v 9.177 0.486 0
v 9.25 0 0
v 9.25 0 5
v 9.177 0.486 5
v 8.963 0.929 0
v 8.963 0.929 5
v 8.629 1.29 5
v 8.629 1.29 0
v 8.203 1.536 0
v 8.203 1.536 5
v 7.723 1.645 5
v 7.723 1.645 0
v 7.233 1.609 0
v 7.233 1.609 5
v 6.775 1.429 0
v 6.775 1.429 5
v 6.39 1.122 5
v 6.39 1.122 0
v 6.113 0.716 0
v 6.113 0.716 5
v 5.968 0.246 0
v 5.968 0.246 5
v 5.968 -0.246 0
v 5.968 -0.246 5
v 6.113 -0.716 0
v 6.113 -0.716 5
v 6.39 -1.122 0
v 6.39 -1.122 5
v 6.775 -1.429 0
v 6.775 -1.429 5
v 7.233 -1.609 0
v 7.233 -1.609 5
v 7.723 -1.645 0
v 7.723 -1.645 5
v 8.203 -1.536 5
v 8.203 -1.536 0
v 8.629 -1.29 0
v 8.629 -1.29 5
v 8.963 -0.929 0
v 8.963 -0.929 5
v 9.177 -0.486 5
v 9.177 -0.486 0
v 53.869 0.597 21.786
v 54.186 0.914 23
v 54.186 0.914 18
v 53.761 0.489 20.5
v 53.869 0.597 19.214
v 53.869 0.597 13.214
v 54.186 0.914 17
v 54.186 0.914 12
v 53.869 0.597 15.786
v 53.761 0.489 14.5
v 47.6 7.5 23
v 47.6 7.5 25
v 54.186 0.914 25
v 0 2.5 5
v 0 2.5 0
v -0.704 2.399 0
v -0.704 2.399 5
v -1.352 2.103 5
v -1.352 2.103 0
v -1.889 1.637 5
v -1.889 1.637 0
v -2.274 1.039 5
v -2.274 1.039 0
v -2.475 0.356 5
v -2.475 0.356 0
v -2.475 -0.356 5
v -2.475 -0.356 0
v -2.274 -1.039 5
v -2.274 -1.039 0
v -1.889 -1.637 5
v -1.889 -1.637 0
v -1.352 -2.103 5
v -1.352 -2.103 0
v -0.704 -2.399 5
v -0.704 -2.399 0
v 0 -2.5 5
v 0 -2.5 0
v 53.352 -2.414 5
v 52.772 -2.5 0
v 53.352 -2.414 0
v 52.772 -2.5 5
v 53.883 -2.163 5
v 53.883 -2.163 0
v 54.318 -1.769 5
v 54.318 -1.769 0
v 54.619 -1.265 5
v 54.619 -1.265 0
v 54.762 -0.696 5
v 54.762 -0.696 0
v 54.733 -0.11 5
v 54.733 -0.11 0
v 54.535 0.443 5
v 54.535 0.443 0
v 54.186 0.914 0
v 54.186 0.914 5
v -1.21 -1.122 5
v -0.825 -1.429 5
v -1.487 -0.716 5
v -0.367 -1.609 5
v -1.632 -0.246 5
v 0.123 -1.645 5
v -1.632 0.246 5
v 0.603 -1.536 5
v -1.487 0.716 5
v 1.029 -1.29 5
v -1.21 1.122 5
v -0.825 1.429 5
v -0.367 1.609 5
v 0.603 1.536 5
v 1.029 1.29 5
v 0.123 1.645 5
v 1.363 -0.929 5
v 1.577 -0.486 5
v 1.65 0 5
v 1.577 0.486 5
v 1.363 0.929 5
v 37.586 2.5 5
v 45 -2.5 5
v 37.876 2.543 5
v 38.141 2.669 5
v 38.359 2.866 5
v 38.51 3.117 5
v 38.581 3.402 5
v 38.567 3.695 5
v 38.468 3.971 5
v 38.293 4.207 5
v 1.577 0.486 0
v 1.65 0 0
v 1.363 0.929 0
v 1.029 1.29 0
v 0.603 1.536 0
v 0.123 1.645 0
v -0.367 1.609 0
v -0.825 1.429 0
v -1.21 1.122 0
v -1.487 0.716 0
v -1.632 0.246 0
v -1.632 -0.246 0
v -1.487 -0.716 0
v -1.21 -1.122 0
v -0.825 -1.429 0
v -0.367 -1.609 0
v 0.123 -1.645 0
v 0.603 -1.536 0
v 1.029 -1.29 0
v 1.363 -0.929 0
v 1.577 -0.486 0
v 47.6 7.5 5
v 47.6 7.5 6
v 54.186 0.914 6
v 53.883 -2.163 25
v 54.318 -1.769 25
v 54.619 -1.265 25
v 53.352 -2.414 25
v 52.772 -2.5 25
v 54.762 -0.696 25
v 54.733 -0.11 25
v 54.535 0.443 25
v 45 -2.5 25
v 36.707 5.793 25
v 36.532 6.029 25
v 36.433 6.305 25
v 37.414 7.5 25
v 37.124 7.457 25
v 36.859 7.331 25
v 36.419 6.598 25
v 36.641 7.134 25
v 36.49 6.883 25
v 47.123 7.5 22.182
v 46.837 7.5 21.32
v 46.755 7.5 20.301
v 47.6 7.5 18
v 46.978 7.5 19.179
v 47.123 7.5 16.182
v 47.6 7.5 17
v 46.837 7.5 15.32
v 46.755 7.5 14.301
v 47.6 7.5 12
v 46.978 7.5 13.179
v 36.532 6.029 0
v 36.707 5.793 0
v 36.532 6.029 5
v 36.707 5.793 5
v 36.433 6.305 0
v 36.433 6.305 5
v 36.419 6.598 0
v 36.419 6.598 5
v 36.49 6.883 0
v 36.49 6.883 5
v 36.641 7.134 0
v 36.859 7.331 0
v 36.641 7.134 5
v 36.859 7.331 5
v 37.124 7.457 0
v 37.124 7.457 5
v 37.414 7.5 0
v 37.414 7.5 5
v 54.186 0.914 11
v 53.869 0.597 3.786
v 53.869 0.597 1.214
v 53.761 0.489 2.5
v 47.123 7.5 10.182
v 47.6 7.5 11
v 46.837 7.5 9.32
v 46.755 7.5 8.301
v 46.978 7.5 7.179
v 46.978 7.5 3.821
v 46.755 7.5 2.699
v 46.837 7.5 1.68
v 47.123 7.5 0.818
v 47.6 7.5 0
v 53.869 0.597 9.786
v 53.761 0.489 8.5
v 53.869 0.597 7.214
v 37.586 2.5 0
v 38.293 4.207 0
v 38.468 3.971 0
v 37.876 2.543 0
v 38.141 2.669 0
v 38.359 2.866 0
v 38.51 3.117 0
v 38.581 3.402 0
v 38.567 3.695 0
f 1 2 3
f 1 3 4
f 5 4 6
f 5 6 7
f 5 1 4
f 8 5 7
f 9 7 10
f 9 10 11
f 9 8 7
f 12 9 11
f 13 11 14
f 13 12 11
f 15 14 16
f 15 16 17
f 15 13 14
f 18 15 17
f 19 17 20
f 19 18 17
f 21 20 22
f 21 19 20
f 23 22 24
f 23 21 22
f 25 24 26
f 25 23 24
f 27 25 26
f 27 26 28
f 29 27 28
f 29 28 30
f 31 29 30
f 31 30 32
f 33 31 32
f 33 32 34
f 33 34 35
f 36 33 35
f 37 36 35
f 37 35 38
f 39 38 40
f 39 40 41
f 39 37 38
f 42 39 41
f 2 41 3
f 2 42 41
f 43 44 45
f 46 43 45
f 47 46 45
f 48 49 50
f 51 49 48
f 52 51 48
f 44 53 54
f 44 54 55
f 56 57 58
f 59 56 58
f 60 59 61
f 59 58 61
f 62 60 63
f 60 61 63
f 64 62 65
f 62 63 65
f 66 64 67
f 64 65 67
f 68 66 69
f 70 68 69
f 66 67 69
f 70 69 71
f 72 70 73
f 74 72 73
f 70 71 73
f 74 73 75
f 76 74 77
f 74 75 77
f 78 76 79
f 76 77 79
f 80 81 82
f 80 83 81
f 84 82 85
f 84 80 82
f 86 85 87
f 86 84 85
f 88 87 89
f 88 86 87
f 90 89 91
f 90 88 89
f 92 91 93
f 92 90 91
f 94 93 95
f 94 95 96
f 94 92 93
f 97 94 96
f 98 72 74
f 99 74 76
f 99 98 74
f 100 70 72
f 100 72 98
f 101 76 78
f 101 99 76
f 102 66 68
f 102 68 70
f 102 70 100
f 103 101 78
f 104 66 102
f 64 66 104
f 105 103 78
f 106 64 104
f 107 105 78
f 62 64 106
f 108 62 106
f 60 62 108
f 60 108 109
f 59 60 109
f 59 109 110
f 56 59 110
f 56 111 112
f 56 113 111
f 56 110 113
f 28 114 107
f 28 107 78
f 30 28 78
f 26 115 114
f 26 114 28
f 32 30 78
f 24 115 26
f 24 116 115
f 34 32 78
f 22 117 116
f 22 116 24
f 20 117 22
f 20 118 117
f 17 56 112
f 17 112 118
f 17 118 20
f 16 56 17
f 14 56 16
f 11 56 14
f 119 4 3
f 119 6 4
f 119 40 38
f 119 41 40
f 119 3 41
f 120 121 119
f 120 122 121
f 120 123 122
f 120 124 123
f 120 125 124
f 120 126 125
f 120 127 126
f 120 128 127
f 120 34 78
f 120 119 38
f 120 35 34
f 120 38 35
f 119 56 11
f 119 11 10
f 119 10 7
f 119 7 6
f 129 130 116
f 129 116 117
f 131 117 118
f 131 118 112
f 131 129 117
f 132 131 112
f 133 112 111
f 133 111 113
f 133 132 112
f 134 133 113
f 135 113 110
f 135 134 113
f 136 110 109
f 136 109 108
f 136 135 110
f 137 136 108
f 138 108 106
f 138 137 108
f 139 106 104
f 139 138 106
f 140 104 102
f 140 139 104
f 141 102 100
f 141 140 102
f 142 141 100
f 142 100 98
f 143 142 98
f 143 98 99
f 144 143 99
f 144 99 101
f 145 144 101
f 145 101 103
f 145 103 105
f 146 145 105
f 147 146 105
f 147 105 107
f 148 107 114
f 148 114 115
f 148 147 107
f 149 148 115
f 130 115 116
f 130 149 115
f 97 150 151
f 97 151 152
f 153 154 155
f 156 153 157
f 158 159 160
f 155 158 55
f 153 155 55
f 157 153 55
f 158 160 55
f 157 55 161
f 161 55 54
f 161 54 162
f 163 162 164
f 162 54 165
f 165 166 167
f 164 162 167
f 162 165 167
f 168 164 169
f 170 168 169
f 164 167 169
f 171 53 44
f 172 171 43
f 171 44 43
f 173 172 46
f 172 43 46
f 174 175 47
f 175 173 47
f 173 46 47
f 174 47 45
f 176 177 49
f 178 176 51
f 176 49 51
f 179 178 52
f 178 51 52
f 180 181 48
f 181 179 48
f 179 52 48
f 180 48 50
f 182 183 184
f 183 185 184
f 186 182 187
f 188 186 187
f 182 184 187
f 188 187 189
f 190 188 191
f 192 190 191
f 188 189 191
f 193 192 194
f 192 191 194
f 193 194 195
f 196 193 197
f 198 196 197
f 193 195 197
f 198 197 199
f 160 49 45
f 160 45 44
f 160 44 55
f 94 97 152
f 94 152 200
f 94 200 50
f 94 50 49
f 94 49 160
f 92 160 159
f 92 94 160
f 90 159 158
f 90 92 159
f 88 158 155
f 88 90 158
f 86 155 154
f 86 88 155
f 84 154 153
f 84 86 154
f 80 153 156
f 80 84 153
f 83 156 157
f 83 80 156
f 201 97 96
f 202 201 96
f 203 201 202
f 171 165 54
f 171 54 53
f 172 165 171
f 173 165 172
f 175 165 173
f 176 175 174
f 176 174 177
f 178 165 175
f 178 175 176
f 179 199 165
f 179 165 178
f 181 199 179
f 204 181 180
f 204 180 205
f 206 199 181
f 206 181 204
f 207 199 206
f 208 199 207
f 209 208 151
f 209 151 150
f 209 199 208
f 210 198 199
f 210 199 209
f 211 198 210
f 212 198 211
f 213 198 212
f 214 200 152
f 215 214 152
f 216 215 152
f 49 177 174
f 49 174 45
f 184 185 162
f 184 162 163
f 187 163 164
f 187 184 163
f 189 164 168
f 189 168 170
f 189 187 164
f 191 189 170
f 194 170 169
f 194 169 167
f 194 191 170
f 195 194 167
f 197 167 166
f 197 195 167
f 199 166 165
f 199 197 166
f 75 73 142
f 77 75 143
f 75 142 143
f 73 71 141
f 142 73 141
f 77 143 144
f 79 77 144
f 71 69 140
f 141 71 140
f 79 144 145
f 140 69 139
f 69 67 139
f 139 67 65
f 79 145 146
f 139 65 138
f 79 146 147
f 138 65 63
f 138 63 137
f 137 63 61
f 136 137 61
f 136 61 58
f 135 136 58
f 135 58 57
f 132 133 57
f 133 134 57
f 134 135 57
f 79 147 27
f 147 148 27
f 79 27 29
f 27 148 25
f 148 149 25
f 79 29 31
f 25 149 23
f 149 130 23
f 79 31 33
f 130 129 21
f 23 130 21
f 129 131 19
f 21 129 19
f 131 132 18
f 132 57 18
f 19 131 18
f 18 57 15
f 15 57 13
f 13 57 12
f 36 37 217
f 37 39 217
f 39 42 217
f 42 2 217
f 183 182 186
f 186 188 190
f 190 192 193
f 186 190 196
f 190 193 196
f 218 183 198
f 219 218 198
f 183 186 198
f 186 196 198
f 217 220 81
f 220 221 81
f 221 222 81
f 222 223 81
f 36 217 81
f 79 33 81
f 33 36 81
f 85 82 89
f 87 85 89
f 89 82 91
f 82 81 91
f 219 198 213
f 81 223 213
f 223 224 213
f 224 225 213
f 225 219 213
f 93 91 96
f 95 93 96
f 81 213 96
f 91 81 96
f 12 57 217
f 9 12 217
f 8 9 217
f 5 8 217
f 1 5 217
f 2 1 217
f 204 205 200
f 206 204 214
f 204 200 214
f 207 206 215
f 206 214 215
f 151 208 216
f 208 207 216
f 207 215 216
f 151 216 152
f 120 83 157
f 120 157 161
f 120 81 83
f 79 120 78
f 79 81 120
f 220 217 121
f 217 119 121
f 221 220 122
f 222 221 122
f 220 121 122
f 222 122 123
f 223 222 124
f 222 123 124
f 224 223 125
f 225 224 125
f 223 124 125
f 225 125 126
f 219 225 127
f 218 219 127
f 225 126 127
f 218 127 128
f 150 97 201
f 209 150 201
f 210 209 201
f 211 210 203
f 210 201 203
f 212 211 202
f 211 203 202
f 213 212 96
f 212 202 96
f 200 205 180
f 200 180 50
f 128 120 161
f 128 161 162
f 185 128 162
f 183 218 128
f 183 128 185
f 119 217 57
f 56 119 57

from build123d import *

# Parameters (mm, degrees)
SKETCH2_R           = 1.65
BOSS_EXTRUDE1_DEPTH = 5
FILLET1_R           = 2
FILLET2_R           = 1
FILLET3_R           = 1
SKETCH3_R           = 5.5
CUT_EXTRUDE1_DEPTH  = 34
BOSS_EXTRUDE2_DEPTH = 20
LPATTERN1_COUNT     = 4
LPATTERN1_PITCH     = 6


with BuildPart() as part:
    # Sketch2 → Boss-Extrude1 (new body)
    with BuildSketch(Plane.XY):
        with BuildLine():
            Line((40, 2.5), (0, 2.5))
            ThreePointArc((0, 2.5), (-2.5, 0), (0, -2.5))
            Line((0, -2.5), (57.6, -2.5))
            Line((57.6, -2.5), (47.6, 7.5))
            Line((47.6, 7.5), (35, 7.5))
            Line((35, 7.5), (40, 2.5))
        make_face()
        with Locations((7.6, 0)):
            Circle(SKETCH2_R, mode=Mode.SUBTRACT)
        Circle(SKETCH2_R, mode=Mode.SUBTRACT)
    extrude(amount=BOSS_EXTRUDE1_DEPTH)

    # Fillet1
    fillet1_edges = [part.edges().sort_by_distance(p)[0] for p in [
        (57.6, -2.5, 2.5),
    ]]
    fillet(fillet1_edges, radius=FILLET1_R)

    # Fillet2
    fillet2_edges = [part.edges().sort_by_distance(p)[0] for p in [
        (40, 2.5, 2.5),
    ]]
    fillet(fillet2_edges, radius=FILLET2_R)

    # Fillet3
    fillet3_edges = [part.edges().sort_by_distance(p)[0] for p in [
        (35, 7.5, 2.5),
    ]]
    fillet(fillet3_edges, radius=FILLET3_R)

    # Sketch3 → Cut-Extrude1 (cut)
    with BuildSketch(Plane(origin=(26.635786438, -26.635786438, 0), x_dir=(0, 0, -1), z_dir=(0.707106781, -0.707106781, 0))):
        with Locations((-2.5, 43.860563129)):
            Circle(SKETCH3_R)
    cut_extrude1 = extrude(amount=-CUT_EXTRUDE1_DEPTH, mode=Mode.SUBTRACT)

    # Sketch4 → Boss-Extrude2 (add)
    with BuildSketch(Plane.XY.offset(5)):
        with BuildLine():
            Line((37.414213562, 7.5), (47.6, 7.5))
            Line((47.6, 7.5), (54.185786438, 0.914213562))
            ThreePointArc((54.185786438, 0.914213562), (54.61933194, -1.265366865), (52.771572875, -2.5))
            Line((52.771572875, -2.5), (45, -2.5))
            Line((45, -2.5), (38.292893219, 4.207106781))
            Line((38.292893219, 4.207106781), (36.707106781, 5.792893219))
            ThreePointArc((36.707106781, 5.792893219), (36.49033403, 6.882683432), (37.414213562, 7.5))
        make_face()
    extrude(amount=BOSS_EXTRUDE2_DEPTH)

    # LPattern1: Cut-Extrude1 ×4
    with Locations(*[(0, 0, i * LPATTERN1_PITCH) for i in range(1, LPATTERN1_COUNT)]):
        add(cut_extrude1, mode=Mode.SUBTRACT)


solid = part.part
